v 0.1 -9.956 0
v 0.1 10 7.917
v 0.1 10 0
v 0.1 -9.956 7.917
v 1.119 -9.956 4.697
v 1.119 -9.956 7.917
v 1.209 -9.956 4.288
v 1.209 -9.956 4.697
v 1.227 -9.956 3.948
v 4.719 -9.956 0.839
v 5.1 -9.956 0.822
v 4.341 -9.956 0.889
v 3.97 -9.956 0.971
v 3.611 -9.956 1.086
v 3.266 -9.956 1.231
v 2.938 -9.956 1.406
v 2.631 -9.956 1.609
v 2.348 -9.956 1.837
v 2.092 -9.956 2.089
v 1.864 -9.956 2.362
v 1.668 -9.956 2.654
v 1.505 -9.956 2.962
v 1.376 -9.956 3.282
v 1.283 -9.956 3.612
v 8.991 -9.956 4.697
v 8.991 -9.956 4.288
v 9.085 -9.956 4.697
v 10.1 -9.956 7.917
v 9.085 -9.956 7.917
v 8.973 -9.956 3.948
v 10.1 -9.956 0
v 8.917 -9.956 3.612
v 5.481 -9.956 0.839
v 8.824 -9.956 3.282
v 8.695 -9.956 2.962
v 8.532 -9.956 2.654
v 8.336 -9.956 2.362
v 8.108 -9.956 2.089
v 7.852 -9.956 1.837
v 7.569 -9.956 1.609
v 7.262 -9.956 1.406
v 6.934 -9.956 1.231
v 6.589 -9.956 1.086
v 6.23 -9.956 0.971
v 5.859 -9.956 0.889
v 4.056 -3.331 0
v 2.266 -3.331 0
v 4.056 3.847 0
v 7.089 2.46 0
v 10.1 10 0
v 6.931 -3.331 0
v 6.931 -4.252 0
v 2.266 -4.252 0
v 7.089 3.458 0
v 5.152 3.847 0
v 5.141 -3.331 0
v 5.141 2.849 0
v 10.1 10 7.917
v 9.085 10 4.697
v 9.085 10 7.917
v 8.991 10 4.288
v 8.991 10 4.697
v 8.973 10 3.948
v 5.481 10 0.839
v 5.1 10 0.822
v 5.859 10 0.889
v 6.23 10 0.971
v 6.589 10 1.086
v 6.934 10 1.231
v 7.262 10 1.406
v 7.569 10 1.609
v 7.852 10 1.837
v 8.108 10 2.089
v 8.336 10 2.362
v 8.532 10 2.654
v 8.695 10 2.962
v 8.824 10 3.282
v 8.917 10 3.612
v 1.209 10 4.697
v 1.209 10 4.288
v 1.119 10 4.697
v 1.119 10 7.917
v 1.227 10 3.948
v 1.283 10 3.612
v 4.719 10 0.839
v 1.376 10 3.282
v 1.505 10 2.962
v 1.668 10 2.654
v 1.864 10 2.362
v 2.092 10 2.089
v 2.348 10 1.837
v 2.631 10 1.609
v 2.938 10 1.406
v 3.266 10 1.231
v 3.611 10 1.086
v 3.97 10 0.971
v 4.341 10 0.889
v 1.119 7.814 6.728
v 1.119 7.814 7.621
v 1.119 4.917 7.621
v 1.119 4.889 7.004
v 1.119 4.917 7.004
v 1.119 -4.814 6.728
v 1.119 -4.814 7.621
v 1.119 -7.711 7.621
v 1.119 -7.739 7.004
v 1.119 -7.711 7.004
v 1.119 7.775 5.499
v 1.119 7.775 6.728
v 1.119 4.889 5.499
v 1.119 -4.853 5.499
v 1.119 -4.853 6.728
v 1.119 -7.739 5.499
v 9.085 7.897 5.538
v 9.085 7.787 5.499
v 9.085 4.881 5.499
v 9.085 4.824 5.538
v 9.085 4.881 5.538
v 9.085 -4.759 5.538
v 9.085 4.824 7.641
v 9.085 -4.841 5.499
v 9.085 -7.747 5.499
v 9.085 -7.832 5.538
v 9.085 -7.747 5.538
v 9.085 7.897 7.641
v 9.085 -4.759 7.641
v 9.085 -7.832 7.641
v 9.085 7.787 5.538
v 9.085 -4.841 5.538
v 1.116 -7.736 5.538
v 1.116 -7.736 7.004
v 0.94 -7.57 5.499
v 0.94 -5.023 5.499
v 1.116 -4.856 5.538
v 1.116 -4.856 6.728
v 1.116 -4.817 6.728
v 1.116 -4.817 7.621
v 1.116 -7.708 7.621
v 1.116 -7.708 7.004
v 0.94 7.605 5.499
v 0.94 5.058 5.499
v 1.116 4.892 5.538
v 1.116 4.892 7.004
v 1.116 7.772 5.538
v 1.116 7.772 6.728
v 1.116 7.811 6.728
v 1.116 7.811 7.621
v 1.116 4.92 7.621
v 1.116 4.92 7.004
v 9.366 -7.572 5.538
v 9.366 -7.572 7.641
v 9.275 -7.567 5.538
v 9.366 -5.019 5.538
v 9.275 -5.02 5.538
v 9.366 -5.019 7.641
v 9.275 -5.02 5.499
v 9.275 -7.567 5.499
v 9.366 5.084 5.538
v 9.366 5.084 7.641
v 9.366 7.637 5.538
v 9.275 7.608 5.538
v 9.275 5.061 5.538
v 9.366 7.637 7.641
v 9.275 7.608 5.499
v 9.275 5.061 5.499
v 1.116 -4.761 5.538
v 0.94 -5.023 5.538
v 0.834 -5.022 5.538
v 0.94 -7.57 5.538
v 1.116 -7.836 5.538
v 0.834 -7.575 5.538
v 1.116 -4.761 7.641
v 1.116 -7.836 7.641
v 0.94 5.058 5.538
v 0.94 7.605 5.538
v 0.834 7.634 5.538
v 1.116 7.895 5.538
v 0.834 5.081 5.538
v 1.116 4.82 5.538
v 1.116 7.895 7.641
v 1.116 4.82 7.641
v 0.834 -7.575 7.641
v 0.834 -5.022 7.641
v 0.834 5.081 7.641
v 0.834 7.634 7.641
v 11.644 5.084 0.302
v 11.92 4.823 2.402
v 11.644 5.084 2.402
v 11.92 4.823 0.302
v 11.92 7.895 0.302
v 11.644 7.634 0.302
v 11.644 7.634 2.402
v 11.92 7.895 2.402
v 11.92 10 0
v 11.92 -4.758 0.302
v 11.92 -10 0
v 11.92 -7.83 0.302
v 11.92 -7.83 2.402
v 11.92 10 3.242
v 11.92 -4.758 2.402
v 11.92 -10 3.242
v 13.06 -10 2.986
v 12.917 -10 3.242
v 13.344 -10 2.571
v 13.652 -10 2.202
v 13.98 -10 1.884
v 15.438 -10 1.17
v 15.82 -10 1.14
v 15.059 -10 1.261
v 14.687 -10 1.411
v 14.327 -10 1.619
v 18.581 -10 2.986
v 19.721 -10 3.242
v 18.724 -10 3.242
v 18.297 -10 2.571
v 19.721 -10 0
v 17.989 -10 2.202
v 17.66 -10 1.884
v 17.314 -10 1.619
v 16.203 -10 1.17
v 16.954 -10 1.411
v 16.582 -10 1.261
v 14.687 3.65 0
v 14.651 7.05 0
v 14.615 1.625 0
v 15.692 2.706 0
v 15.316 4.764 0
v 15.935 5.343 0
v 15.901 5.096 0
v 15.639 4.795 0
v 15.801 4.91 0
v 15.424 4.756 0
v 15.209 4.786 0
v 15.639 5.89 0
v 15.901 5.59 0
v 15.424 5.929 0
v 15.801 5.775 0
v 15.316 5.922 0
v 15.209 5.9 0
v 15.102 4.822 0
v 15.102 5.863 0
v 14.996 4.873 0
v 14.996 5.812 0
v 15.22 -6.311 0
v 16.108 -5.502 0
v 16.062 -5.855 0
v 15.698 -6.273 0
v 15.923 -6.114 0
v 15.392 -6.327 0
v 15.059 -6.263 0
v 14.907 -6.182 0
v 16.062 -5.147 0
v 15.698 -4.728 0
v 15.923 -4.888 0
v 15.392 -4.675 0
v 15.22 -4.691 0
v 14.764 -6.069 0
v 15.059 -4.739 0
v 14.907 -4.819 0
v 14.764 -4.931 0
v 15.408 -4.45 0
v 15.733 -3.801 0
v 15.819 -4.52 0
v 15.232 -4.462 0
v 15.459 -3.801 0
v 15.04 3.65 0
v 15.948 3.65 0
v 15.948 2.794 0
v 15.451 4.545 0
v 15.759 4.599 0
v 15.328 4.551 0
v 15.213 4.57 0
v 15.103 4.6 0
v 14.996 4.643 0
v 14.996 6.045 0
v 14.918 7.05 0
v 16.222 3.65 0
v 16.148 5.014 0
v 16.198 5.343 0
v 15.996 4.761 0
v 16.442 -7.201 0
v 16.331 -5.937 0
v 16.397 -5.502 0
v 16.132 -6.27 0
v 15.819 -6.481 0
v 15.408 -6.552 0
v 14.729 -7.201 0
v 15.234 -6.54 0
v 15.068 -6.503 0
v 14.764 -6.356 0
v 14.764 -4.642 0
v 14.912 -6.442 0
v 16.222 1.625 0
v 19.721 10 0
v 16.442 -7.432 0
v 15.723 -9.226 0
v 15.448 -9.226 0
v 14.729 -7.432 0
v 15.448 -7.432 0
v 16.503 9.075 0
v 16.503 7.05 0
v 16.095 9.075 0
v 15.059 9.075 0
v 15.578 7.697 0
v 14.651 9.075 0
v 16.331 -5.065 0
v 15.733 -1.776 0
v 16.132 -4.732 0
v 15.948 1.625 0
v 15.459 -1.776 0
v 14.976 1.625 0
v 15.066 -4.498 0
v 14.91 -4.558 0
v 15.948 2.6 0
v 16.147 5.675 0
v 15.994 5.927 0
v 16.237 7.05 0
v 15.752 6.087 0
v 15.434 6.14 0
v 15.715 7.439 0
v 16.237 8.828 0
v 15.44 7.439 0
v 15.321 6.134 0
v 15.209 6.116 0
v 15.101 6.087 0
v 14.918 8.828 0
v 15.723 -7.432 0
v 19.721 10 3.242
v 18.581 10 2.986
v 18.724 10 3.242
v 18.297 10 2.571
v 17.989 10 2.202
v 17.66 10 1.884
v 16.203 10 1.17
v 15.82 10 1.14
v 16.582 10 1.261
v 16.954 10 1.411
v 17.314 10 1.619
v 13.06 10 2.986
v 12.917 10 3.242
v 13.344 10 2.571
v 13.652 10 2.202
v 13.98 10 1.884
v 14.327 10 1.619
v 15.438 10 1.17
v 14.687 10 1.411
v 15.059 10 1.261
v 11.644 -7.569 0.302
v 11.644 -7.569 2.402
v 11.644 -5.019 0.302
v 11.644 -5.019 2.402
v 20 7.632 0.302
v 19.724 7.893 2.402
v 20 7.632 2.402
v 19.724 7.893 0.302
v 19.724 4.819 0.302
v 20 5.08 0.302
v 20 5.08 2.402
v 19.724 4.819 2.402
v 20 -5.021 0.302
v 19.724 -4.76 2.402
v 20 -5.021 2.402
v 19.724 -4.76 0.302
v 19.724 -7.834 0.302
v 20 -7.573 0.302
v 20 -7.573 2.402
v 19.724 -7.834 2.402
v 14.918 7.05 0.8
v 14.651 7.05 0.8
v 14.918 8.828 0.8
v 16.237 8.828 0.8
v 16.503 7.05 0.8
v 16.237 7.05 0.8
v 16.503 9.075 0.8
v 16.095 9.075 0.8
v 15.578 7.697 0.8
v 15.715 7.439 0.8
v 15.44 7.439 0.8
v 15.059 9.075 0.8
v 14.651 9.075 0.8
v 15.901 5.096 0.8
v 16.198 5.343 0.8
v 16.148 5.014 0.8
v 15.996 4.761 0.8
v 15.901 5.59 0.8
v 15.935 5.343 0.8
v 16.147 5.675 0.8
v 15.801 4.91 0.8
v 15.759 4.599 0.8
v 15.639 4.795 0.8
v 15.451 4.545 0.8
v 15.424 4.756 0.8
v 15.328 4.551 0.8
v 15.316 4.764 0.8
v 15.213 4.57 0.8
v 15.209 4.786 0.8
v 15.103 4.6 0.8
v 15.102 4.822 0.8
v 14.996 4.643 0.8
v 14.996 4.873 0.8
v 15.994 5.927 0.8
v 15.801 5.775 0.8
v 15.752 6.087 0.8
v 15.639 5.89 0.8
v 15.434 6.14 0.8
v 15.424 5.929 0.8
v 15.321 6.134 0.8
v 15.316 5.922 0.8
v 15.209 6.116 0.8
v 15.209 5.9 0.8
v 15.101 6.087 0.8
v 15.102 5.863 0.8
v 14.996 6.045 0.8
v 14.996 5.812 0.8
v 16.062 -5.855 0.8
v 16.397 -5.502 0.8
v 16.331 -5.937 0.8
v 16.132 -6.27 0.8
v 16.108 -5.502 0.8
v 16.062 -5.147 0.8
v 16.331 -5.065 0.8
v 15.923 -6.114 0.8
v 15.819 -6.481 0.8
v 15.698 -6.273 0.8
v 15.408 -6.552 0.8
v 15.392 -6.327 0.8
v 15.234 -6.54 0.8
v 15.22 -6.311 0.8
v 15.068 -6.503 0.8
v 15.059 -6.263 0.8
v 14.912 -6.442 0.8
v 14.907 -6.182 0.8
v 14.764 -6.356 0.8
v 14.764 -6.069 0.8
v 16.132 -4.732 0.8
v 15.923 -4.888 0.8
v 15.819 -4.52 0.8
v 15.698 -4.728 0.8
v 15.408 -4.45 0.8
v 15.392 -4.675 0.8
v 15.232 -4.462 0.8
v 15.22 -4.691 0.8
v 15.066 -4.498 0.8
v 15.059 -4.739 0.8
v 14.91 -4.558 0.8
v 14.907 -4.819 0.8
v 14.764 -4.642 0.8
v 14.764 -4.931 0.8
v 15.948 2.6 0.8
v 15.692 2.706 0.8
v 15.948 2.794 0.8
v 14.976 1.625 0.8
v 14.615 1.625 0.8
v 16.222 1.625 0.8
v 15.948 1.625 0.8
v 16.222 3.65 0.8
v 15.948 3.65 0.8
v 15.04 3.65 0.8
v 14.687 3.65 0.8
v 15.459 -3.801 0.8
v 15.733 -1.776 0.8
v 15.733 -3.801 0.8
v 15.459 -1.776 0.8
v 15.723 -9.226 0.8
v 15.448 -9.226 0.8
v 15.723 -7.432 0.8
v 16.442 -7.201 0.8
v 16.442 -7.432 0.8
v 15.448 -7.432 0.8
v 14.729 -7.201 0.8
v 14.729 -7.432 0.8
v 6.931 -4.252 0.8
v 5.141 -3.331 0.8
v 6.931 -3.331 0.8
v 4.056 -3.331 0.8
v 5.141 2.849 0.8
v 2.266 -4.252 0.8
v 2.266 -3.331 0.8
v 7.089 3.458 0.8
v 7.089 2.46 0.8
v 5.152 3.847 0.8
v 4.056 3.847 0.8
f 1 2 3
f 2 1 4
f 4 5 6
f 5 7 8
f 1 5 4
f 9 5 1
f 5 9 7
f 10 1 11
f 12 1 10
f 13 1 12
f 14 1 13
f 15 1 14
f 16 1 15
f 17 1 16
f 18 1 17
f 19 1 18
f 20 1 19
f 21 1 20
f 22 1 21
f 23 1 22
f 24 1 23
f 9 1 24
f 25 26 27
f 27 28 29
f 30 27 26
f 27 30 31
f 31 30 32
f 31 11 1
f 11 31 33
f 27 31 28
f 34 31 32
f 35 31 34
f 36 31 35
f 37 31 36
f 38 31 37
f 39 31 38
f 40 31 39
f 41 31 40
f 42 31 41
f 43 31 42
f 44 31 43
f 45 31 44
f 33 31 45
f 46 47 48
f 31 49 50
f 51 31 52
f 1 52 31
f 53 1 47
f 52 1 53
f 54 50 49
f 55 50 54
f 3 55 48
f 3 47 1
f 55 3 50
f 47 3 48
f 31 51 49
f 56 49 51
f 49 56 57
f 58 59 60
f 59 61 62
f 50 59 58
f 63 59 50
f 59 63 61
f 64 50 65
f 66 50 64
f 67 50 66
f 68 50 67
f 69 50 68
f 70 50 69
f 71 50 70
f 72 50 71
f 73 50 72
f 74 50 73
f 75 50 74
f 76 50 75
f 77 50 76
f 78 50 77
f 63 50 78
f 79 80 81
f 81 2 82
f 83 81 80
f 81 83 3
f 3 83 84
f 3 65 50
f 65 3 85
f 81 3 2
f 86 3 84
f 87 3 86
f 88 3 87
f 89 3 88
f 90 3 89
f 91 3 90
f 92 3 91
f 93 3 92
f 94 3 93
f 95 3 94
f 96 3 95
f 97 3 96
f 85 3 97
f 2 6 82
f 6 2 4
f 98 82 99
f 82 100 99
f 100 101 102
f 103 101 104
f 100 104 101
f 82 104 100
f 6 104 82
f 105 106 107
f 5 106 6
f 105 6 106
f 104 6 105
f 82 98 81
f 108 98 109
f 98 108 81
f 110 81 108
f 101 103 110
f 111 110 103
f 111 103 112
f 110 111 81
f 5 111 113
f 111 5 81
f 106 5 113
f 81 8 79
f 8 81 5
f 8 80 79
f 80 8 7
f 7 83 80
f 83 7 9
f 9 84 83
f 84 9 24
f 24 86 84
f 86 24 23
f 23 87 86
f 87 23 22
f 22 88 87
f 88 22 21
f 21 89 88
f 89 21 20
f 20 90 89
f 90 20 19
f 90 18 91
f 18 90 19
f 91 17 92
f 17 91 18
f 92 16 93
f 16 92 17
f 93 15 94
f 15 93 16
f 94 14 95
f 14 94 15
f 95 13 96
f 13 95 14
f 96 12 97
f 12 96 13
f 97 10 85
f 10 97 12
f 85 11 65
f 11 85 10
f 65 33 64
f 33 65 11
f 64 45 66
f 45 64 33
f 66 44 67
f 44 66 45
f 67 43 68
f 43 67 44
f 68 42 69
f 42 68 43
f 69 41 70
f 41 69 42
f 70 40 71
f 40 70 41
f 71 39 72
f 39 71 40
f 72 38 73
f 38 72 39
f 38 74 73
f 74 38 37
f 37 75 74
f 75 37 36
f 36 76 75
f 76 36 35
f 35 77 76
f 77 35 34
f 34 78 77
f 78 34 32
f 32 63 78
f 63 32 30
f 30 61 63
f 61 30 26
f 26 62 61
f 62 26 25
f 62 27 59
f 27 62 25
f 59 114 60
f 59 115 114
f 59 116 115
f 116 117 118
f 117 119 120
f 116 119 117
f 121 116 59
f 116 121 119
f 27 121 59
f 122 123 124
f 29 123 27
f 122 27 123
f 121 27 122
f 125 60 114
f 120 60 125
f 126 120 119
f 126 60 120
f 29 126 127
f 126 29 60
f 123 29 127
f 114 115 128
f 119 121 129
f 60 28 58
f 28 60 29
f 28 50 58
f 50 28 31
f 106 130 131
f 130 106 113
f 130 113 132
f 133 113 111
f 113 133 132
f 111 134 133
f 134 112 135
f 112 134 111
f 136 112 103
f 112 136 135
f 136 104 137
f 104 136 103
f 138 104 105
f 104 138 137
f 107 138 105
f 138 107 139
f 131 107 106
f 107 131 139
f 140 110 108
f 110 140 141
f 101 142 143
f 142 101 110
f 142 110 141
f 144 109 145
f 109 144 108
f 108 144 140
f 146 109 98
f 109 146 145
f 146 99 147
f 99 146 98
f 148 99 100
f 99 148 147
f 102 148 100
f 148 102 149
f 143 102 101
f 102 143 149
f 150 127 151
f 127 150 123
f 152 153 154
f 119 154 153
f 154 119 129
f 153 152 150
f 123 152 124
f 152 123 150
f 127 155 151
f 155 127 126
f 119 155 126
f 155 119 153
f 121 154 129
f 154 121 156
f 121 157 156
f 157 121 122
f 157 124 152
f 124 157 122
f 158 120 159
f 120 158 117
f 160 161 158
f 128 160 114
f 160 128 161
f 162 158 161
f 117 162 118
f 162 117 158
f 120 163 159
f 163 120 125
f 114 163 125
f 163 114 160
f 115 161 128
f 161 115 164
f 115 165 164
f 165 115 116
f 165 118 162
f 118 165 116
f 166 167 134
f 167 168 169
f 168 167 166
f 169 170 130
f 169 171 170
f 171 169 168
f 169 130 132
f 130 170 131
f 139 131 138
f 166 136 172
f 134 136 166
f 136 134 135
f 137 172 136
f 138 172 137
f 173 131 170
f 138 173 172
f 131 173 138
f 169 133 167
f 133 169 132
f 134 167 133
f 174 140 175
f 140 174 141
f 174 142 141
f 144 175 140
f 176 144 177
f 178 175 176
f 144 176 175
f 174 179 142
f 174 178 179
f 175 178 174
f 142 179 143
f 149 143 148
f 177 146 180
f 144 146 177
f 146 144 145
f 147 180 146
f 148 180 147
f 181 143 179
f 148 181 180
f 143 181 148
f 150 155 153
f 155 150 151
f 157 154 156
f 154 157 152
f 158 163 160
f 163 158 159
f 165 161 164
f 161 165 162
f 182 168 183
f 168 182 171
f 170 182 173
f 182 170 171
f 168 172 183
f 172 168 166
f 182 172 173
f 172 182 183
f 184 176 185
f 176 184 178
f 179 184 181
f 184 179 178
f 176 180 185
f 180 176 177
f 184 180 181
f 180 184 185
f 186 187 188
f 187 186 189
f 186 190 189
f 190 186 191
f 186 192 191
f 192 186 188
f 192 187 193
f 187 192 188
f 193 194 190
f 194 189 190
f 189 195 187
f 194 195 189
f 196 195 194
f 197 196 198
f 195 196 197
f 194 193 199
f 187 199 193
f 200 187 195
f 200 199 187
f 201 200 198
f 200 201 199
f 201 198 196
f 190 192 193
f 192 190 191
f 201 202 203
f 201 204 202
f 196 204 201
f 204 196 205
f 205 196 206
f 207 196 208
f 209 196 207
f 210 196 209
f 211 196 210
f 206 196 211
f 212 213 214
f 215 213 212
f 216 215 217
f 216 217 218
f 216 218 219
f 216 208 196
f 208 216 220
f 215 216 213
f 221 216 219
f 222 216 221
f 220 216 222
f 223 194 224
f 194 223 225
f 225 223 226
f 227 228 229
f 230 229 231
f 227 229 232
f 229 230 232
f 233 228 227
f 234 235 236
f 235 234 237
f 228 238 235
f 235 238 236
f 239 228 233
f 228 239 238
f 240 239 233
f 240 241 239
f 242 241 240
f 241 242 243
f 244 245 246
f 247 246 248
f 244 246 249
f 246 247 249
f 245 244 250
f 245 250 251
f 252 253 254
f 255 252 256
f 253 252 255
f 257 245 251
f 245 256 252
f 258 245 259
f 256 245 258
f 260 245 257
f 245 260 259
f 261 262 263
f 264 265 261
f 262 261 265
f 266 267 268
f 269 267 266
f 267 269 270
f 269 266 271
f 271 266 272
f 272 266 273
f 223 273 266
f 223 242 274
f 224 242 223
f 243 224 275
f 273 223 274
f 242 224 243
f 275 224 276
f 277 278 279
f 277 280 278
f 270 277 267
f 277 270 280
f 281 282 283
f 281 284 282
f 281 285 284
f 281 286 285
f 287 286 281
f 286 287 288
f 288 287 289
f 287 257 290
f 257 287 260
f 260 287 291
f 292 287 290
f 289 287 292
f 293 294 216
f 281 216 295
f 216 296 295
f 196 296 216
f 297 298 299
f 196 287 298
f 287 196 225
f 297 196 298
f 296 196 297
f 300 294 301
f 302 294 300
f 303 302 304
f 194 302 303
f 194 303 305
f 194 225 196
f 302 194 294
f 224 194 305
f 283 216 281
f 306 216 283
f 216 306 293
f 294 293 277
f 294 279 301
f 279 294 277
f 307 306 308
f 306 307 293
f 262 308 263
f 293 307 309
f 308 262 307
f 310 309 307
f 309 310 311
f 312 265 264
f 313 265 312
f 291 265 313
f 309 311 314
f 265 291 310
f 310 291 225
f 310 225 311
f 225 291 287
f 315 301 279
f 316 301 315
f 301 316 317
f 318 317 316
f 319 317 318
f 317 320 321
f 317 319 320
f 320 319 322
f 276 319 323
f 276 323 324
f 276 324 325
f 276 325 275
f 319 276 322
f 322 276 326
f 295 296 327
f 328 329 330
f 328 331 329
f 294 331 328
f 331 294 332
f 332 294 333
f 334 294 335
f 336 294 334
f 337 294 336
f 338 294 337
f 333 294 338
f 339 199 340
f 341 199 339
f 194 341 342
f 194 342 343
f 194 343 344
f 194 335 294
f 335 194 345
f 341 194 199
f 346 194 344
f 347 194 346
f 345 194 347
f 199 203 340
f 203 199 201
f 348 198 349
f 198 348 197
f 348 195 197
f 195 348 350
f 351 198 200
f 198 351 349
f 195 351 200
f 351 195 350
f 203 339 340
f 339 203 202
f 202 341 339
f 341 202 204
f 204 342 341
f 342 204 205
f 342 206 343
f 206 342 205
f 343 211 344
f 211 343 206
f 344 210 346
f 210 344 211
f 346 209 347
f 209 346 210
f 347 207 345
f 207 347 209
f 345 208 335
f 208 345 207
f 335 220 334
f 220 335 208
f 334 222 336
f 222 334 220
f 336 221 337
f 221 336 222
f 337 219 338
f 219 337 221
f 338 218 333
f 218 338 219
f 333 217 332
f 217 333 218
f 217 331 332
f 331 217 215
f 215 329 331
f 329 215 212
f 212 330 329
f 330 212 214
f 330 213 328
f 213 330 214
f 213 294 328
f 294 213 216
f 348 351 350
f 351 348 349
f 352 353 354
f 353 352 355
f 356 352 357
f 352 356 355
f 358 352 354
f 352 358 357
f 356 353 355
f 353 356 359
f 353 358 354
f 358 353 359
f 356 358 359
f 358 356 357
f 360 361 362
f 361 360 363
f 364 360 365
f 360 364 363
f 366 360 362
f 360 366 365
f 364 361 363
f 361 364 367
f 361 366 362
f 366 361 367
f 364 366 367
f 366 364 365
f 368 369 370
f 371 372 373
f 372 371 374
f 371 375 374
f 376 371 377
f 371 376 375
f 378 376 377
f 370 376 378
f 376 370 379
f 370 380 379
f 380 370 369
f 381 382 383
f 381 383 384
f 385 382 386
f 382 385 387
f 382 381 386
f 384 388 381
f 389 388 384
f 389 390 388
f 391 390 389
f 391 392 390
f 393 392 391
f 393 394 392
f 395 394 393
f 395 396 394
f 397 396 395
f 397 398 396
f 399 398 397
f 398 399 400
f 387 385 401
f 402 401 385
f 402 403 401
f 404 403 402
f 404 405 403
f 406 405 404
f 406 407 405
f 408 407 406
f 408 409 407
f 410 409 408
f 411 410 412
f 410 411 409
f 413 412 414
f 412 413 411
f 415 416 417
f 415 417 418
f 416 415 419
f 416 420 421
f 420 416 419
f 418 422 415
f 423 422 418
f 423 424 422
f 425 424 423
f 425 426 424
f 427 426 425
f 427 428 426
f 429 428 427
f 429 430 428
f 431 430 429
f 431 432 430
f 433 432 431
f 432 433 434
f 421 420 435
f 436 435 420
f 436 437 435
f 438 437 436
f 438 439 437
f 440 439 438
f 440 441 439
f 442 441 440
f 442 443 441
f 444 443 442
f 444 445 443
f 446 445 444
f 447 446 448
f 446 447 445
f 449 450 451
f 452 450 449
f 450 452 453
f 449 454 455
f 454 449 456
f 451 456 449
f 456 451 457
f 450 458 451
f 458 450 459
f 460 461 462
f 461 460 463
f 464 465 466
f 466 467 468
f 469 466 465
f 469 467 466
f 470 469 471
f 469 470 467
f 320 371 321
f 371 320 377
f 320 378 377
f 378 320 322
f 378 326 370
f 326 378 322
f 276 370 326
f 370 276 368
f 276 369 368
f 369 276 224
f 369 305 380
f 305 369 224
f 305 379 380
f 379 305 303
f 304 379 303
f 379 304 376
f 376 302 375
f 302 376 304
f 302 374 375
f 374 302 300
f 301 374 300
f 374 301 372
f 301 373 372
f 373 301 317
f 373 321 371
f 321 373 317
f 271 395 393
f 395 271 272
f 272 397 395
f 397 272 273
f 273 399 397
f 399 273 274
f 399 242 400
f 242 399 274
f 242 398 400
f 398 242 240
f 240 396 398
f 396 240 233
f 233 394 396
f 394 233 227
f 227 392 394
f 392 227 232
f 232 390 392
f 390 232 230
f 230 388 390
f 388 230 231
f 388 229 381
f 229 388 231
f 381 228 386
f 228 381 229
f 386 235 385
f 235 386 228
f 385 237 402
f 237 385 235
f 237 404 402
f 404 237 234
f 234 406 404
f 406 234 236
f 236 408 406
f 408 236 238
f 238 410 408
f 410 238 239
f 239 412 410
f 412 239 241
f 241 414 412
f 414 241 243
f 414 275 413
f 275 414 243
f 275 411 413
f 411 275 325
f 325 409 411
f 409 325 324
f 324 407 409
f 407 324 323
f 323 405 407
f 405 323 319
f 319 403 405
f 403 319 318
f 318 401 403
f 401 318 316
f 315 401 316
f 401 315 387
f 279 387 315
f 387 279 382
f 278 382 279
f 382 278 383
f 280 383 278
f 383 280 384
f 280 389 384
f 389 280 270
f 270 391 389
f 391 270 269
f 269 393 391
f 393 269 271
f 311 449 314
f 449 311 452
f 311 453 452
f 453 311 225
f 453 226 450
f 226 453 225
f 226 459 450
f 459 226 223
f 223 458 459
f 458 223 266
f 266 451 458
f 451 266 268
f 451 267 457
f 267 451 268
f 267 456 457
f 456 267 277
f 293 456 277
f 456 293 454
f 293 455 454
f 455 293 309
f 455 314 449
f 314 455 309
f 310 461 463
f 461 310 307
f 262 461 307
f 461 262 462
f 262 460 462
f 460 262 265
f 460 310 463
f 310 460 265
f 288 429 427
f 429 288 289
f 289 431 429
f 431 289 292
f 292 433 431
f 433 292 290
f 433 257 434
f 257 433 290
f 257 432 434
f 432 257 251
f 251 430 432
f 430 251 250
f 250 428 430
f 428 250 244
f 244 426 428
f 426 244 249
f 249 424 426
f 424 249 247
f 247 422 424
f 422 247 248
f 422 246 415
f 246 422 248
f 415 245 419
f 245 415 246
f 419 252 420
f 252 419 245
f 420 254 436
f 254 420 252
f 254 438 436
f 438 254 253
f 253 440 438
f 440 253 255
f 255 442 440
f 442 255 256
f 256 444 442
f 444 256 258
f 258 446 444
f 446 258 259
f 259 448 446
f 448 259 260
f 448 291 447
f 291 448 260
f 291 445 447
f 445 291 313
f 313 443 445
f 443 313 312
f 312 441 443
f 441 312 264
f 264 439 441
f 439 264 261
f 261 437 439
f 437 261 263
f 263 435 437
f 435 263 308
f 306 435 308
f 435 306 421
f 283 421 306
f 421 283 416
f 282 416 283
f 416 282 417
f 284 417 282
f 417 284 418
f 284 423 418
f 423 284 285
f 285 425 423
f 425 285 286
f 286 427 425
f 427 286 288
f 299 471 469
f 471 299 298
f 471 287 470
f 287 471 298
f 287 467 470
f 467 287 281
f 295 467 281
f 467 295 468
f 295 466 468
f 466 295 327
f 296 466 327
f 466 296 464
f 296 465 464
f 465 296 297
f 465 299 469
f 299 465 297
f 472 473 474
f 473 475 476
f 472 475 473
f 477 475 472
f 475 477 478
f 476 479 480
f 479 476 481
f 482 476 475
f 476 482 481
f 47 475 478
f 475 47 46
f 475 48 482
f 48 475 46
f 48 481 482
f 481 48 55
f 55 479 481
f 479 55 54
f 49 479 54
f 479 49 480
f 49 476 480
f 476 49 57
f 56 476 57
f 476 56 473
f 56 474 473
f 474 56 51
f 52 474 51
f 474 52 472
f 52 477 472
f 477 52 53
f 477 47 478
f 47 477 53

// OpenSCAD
// ___________________________________________________________________________________________________________//
// Cabel Label.                                                                                               //
// A small customisable tag made for the ends of chargers or network cables to allow for permanent labelling. //
// Can be glued for extra security.                                                                           //
// ___________________________________________________________________________________________________________//

/* [Text] */
hatchTextIn = "McK ICT"; // Hatch text
bottomTextIn = "1"; // Bottom text

font = "Ubuntu"; //[Advent Pro,Alegreya Sans,Amaranth,Arimo,Arvo,Asap,Asul,Bangers,Basic,Bowlby One SC,Bubblegum Sans,Cabin Condensed,Carter One,Electrolize,Encode Sans Compressed,Exo 2,Federo,Fjord One,Geo,Graduate,Helvetica,Happy Monkey,Hind,Karma,Lemon One,Lilita One,Mako,McLaren,Merienda One,Nova Square,Nunito,Oswald,Oxygen,Permanent Marker,Racing Sans One,Roboto,Share,Source Sans Pro,Teko,Terminal Dosis,Ubuntu,Voces,Wallpoet]

/* [Text Size] */
hatchTextSize = 2; //[0.1:0.01:30.0]
bottomTextSize = 8; //[0.1:0.01:30.0]
hatchTextSpacing = 1; //[0.01:0.01:10.0]

/* [Text Positioning] */
hatchTextNudgeX = -14.7; //[-20.0:0.01:20.0]
hatchTextNudgeY = -0.1; //[-20.0:0.01:20.0]
bottomTextNudgeX = -2.5; //[-20.0:0.01:20.0]
bottomTextNudgeY = -0.3; //[-20.0:0.01:20.0]
textIndent = -0.8; //[-2.0:0.01:1.0]

bottomTextRotate = 0; //[0,90,180]

/* [Scale] */
length = 1; //[0.01:0.001:2.0]
width = 1; //[0.01:0.001:2.0]

/* [Hidden] */
bottomText = str(bottomTextIn); // Bottom text string
hatchText = str(hatchTextIn); // Hatch text string

cablelabelPoints = [
	[0.0999994, -9.956, 0],
	[0.0999994, 10, 0],
	[0.0999994, 10, 7.917],
	[0.0999994, -9.956, 7.917],
	[11.644, 5.08355, 0.301999],
	[11.644, 7.63445, 0.301999],
	[11.644, 7.63445, 2.402],
	[11.644, 5.08355, 2.402],
	[11.644, -7.56945, 0.301999],
	[11.644, -5.01855, 0.301999],
	[11.644, -5.01855, 2.402],
	[11.644, -7.56945, 2.402],
	[20, 7.63211, 0.301999],
	[20, 5.07989, 0.301999],
	[20, 5.07989, 2.402],
	[20, 7.63211, 2.402],
	[20, -5.02089, 0.301999],
	[20, -7.57311, 0.301999],
	[20, -7.57311, 2.402],
	[20, -5.02089, 2.402],
	[19.721, -10, 3.242],
	[18.7243, -10, 3.242],
	[19.721, 10, 3.242],
	[1.119, -4.81433, 7.621],
	[1.119, -7.71066, 7.621],
	[1.119, -9.956, 7.917],
	[1.119, 4.91734, 7.621],
	[1.119, 10, 7.917],
	[1.119, 7.81366, 7.621],
	[8.695, -9.956, 2.962],
	[10.1, -9.956, 0],
	[8.532, -9.956, 2.654],
	[8.336, -9.956, 2.362],
	[1.116, 4.92017, 7.621],
	[1.116, 4.92017, 7.004],
	[1.119, 4.91734, 7.004],
	[1.119, 4.88879, 7.004],
	[1.116, 4.89163, 5.538],
	[1.119, 4.88879, 5.499],
	[19.724, 7.89285, 2.402],
	[19.724, 4.81915, 2.402],
	[19.724, -7.83385, 2.402],
	[19.724, -4.76015, 2.402],
	[19.724, 7.89285, 0.301999],
	[19.724, 4.81915, 0.301999],
	[19.724, -7.83385, 0.301999],
	[19.724, -4.76015, 0.301999],
	[1.116, 4.89163, 7.004],
	[5.1, -9.956, 0.822],
	[5.481, -9.956, 0.839],
	[11.92, 4.82294, 2.402],
	[11.92, 7.89506, 2.402],
	[11.92, 10, 3.242],
	[11.92, -4.75794, 2.402],
	[11.92, -10, 3.242],
	[11.92, -7.83006, 2.402],
	[12.9167, -10, 3.242],
	[13.652, -10, 2.202],
	[13.652, 10, 2.202],
	[13.98, 10, 1.884],
	[1.116, 4.82042, 7.641],
	[1.116, 4.82042, 5.538],
	[13.344, -10, 2.571],
	[13.06, 10, 2.986],
	[13.344, 10, 2.571],
	[1.119, -7.73921, 7.004],
	[1.116, -7.73637, 5.538],
	[1.119, -7.73921, 5.499],
	[1.116, -7.73637, 7.004],
	[1.119, -7.71066, 7.004],
	[1.116, -7.70783, 7.004],
	[12.9167, 10, 3.242],
	[1.116, -7.83558, 7.641],
	[1.116, -7.83558, 5.538],
	[18.7243, 10, 3.242],
	[1.119, -4.81433, 6.728],
	[1.116, -4.81717, 6.728],
	[1.119, -4.85326, 6.728],
	[1.116, -4.8561, 6.728],
	[1.116, 7.81083, 6.728],
	[1.119, 7.81366, 6.728],
	[1.119, 7.77474, 6.728],
	[1.116, 7.7719, 6.728],
	[0.94, -7.57012, 5.499],
	[0.94, -7.57012, 5.538],
	[0.834, -7.57458, 5.538],
	[1.119, -9.956, 4.697],
	[1.116, -4.8561, 5.538],
	[1.119, -4.85326, 5.499],
	[0.94, -5.02252, 5.499],
	[0.94, -5.02252, 5.538],
	[1.116, -4.76142, 5.538],
	[0.94, 5.05788, 5.499],
	[0.94, 5.05788, 5.538],
	[0.834, 5.08142, 5.538],
	[18.581, 10, 2.986],
	[1.116, 7.7719, 5.538],
	[1.119, 7.77474, 5.499],
	[0.94, 7.60548, 5.499],
	[0.94, 7.60548, 5.538],
	[1.116, 7.89458, 5.538],
	[17.314, -10, 1.619],
	[17.314, 10, 1.619],
	[17.66, 10, 1.884],
	[16.954, 10, 1.411],
	[0.834, 7.63358, 5.538],
	[11.92, -10, 0],
	[11.92, -4.75794, 0.301999],
	[11.92, -7.83006, 0.301999],
	[11.92, 10, 0],
	[11.92, 4.82294, 0.301999],
	[11.92, 7.89506, 0.301999],
	[15.438, -10, 1.17],
	[15.059, -10, 1.261],
	[19.721, 10, 0],
	[13.98, -10, 1.884],
	[13.06, -10, 2.986],
	[14.687, -10, 1.411],
	[14.327, -10, 1.619],
	[1.119, 10, 4.697],
	[1.209, 10, 4.697],
	[1.209, -9.956, 4.697],
	[18.581, -10, 2.986],
	[19.721, -10, 0],
	[18.297, -10, 2.571],
	[17.989, -10, 2.202],
	[17.66, -10, 1.884],
	[18.297, 10, 2.571],
	[10.1, 10, 0],
	[10.1, -9.956, 7.917],
	[10.1, 10, 7.917],
	[16.954, -10, 1.411],
	[9.085, -7.83165, 5.538],
	[9.085, -7.7466, 5.499],
	[9.085, -7.7466, 5.538],
	[9.275, -5.02018, 5.499],
	[9.085, -4.84061, 5.499],
	[9.085, -4.84061, 5.538],
	[16.582, -10, 1.261],
	[0.834, -5.02242, 5.538],
	[16.203, -10, 1.17],
	[15.82, -10, 1.14],
	[9.085, -4.75935, 5.538],
	[17.989, 10, 2.202],
	[8.991, -9.956, 4.288],
	[9.085, -9.956, 4.697],
	[8.991, -9.956, 4.697],
	[8.973, -9.956, 3.948],
	[9.085, -9.956, 7.917],
	[9.085, 10, 7.917],
	[9.085, 4.82435, 5.538],
	[9.085, 4.8814, 5.499],
	[9.085, 4.8814, 5.538],
	[0.834, -7.57458, 7.641],
	[9.275, 7.60782, 5.499],
	[9.085, 7.78739, 5.499],
	[9.085, 7.78739, 5.538],
	[3.266, -9.956, 1.231],
	[2.938, -9.956, 1.406],
	[3.611, -9.956, 1.086],
	[3.97, -9.956, 0.971],
	[2.631, -9.956, 1.609],
	[2.348, -9.956, 1.837],
	[2.092, -9.956, 2.089],
	[1.864, -9.956, 2.362],
	[1.668, -9.956, 2.654],
	[8.108, 10, 2.089],
	[8.108, -9.956, 2.089],
	[1.505, -9.956, 2.962],
	[1.376, -9.956, 3.282],
	[1.283, -9.956, 3.612],
	[1.227, -9.956, 3.948],
	[9.085, 7.89665, 5.538],
	[9.366, 7.63658, 5.538],
	[1.209, -9.956, 4.288],
	[9.085, 10, 4.697],
	[7.852, -9.956, 1.837],
	[7.569, -9.956, 1.609],
	[7.262, -9.956, 1.406],
	[6.934, -9.956, 1.231],
	[6.589, -9.956, 1.086],
	[6.23, -9.956, 0.971],
	[5.859, -9.956, 0.889],
	[3.97, 10, 0.971],
	[3.611, 10, 1.086],
	[4.719, -9.956, 0.839],
	[4.341, -9.956, 0.889],
	[3.266, 10, 1.231],
	[2.938, 10, 1.406],
	[8.917, -9.956, 3.612],
	[2.631, 10, 1.609],
	[8.824, -9.956, 3.282],
	[2.348, 10, 1.837],
	[0.834, 5.08142, 7.641],
	[8.991, 10, 4.697],
	[9.275, -7.56712, 5.538],
	[9.275, -7.56712, 5.499],
	[9.366, -7.57158, 5.538],
	[9.085, -7.83165, 7.641],
	[0.834, -5.02242, 7.641],
	[9.275, -5.02018, 5.538],
	[0.834, 7.63358, 7.641],
	[2.092, 10, 2.089],
	[1.864, 10, 2.362],
	[1.668, 10, 2.654],
	[1.505, 10, 2.962],
	[1.376, 10, 3.282],
	[9.275, 5.06088, 5.538],
	[9.275, 5.06088, 5.499],
	[1.283, 10, 3.612],
	[7.852, 10, 1.837],
	[9.366, 5.08442, 5.538],
	[9.275, 7.60782, 5.538],
	[7.569, 10, 1.609],
	[7.262, 10, 1.406],
	[6.934, 10, 1.231],
	[6.589, 10, 1.086],
	[6.23, 10, 0.971],
	[9.366, -7.57158, 7.641],
	[5.859, 10, 0.889],
	[5.481, 10, 0.839],
	[8.991, 10, 4.288],
	[8.973, 10, 3.948],
	[4.341, 10, 0.889],
	[4.719, 10, 0.839],
	[8.917, 10, 3.612],
	[8.824, 10, 3.282],
	[9.085, -4.75935, 7.641],
	[8.695, 10, 2.962],
	[8.532, 10, 2.654],
	[8.336, 10, 2.362],
	[15.059, 10, 1.261],
	[14.687, 10, 1.411],
	[14.327, 10, 1.619],
	[5.1, 10, 0.822],
	[9.366, -5.01942, 5.538],
	[9.366, 5.08442, 7.641],
	[9.366, 7.63658, 7.641],
	[9.085, 7.89665, 7.641],
	[9.366, -5.01942, 7.641],
	[9.085, 4.82435, 7.641],
	[1.209, 10, 4.288],
	[1.227, 10, 3.948],
	[1.116, -7.70783, 7.621],
	[1.116, -4.81717, 7.621],
	[1.116, -4.76142, 7.641],
	[1.116, 7.81083, 7.621],
	[16.582, 10, 1.261],
	[1.116, 7.89458, 7.641],
	[15.438, 10, 1.17],
	[15.82, 10, 1.14],
	[16.203, 10, 1.17],
];

cablelabelFaces = [
	[0, 2, 3],
	[1, 2, 0],
	[129, 30, 145],
	[0, 157, 159],
	[0, 163, 162],
	[145, 30, 144],
	[0, 185, 48],
	[144, 30, 147],
	[0, 161, 158],
	[147, 30, 189],
	[189, 30, 191],
	[191, 30, 29],
	[29, 30, 31],
	[31, 30, 32],
	[32, 30, 167],
	[167, 30, 176],
	[176, 30, 177],
	[177, 30, 178],
	[178, 30, 179],
	[179, 30, 180],
	[0, 186, 185],
	[180, 30, 181],
	[181, 30, 182],
	[182, 30, 0],
	[49, 182, 0],
	[0, 160, 186],
	[0, 159, 160],
	[0, 158, 157],
	[0, 48, 49],
	[145, 144, 146],
	[163, 0, 164],
	[164, 0, 165],
	[165, 0, 168],
	[168, 0, 169],
	[169, 0, 170],
	[170, 0, 171],
	[171, 0, 174],
	[174, 0, 121],
	[121, 0, 86],
	[86, 0, 25],
	[25, 0, 3],
	[0, 162, 161],
	[129, 145, 148],
	[0, 128, 1],
	[30, 128, 0],
	[1, 27, 2],
	[119, 27, 1],
	[120, 119, 1],
	[241, 120, 1],
	[242, 241, 1],
	[1, 209, 242],
	[1, 206, 209],
	[1, 205, 206],
	[1, 204, 205],
	[1, 203, 204],
	[1, 202, 203],
	[1, 192, 202],
	[1, 190, 192],
	[1, 188, 190],
	[1, 187, 188],
	[1, 184, 187],
	[1, 183, 184],
	[1, 223, 183],
	[1, 224, 223],
	[1, 234, 224],
	[1, 220, 234],
	[1, 219, 220],
	[1, 128, 219],
	[219, 128, 217],
	[217, 128, 216],
	[216, 128, 215],
	[215, 128, 214],
	[214, 128, 213],
	[213, 128, 210],
	[210, 128, 166],
	[166, 128, 230],
	[230, 128, 229],
	[229, 128, 228],
	[228, 128, 226],
	[225, 130, 222],
	[175, 194, 221],
	[222, 175, 221],
	[130, 149, 175],
	[222, 130, 175],
	[128, 130, 225],
	[226, 128, 225],
	[27, 25, 3],
	[27, 3, 2],
	[27, 119, 80],
	[67, 86, 25],
	[27, 26, 23],
	[65, 67, 25],
	[26, 75, 23],
	[27, 24, 25],
	[24, 65, 25],
	[27, 23, 24],
	[88, 75, 36],
	[88, 119, 86],
	[38, 119, 88],
	[36, 38, 88],
	[27, 80, 28],
	[80, 119, 97],
	[80, 97, 81],
	[97, 119, 38],
	[27, 28, 26],
	[86, 67, 88],
	[65, 24, 69],
	[75, 88, 77],
	[75, 26, 36],
	[36, 26, 35],
	[120, 121, 86],
	[120, 86, 119],
	[120, 241, 174],
	[120, 174, 121],
	[242, 171, 174],
	[242, 174, 241],
	[209, 170, 171],
	[209, 171, 242],
	[206, 169, 170],
	[206, 170, 209],
	[205, 168, 169],
	[205, 169, 206],
	[204, 165, 168],
	[204, 168, 205],
	[203, 164, 165],
	[203, 165, 204],
	[202, 163, 164],
	[202, 164, 203],
	[192, 162, 163],
	[192, 163, 202],
	[190, 161, 162],
	[190, 162, 192],
	[188, 158, 161],
	[188, 161, 190],
	[187, 157, 158],
	[187, 158, 188],
	[184, 159, 157],
	[184, 157, 187],
	[183, 160, 159],
	[183, 159, 184],
	[223, 186, 160],
	[223, 160, 183],
	[224, 185, 186],
	[224, 186, 223],
	[234, 48, 185],
	[234, 185, 224],
	[220, 49, 48],
	[220, 48, 234],
	[219, 182, 49],
	[219, 49, 220],
	[217, 181, 182],
	[217, 182, 219],
	[216, 180, 181],
	[216, 181, 217],
	[215, 179, 180],
	[215, 180, 216],
	[214, 178, 179],
	[214, 179, 215],
	[213, 177, 178],
	[213, 178, 214],
	[210, 176, 177],
	[210, 177, 213],
	[166, 167, 176],
	[166, 176, 210],
	[167, 230, 32],
	[166, 230, 167],
	[32, 229, 31],
	[230, 229, 32],
	[31, 228, 29],
	[229, 228, 31],
	[29, 226, 191],
	[228, 226, 29],
	[191, 225, 189],
	[226, 225, 191],
	[189, 222, 147],
	[225, 222, 189],
	[147, 221, 144],
	[222, 221, 147],
	[144, 194, 146],
	[221, 194, 144],
	[175, 145, 146],
	[175, 146, 194],
	[175, 149, 172],
	[145, 132, 148],
	[145, 134, 132],
	[145, 133, 134],
	[136, 142, 137],
	[175, 136, 145],
	[142, 240, 227],
	[227, 149, 148],
	[198, 227, 148],
	[132, 198, 148],
	[152, 150, 151],
	[151, 175, 155],
	[151, 150, 136],
	[175, 151, 136],
	[156, 155, 172],
	[172, 149, 238],
	[175, 172, 155],
	[238, 149, 240],
	[240, 142, 150],
	[240, 149, 227],
	[142, 136, 150],
	[133, 145, 136],
	[130, 129, 148],
	[130, 148, 149],
	[130, 128, 30],
	[130, 30, 129],
	[66, 65, 68],
	[67, 65, 66],
	[67, 66, 83],
	[88, 67, 83],
	[88, 83, 89],
	[87, 88, 89],
	[77, 88, 87],
	[77, 87, 78],
	[75, 77, 78],
	[75, 78, 76],
	[23, 75, 76],
	[23, 76, 244],
	[243, 23, 244],
	[24, 23, 243],
	[70, 24, 243],
	[69, 24, 70],
	[68, 69, 70],
	[65, 69, 68],
	[97, 38, 92],
	[97, 92, 98],
	[37, 36, 47],
	[38, 36, 37],
	[38, 37, 92],
	[81, 97, 96],
	[81, 96, 82],
	[96, 97, 98],
	[80, 81, 82],
	[80, 82, 79],
	[28, 80, 79],
	[28, 79, 246],
	[33, 28, 246],
	[26, 28, 33],
	[34, 26, 33],
	[35, 26, 34],
	[47, 35, 34],
	[36, 35, 47],
	[132, 218, 198],
	[197, 218, 132],
	[235, 197, 195],
	[132, 134, 195],
	[235, 137, 142],
	[235, 200, 137],
	[195, 197, 132],
	[235, 195, 200],
	[198, 239, 227],
	[218, 239, 198],
	[239, 235, 142],
	[239, 142, 227],
	[200, 135, 136],
	[200, 136, 137],
	[135, 196, 133],
	[135, 133, 136],
	[133, 195, 134],
	[196, 195, 133],
	[150, 236, 240],
	[211, 236, 150],
	[173, 211, 207],
	[150, 152, 207],
	[173, 156, 172],
	[173, 212, 156],
	[207, 211, 150],
	[173, 207, 212],
	[240, 237, 238],
	[236, 237, 240],
	[237, 173, 172],
	[237, 172, 238],
	[212, 154, 155],
	[212, 155, 156],
	[154, 208, 151],
	[154, 151, 155],
	[151, 207, 152],
	[208, 207, 151],
	[66, 73, 85],
	[84, 85, 90],
	[66, 85, 84],
	[90, 85, 139],
	[87, 90, 91],
	[91, 90, 139],
	[66, 84, 83],
	[68, 73, 66],
	[91, 245, 87],
	[87, 245, 76],
	[87, 76, 78],
	[244, 245, 72],
	[243, 244, 72],
	[73, 243, 72],
	[68, 70, 243],
	[73, 68, 243],
	[76, 245, 244],
	[90, 89, 83],
	[90, 83, 84],
	[90, 87, 89],
	[99, 98, 92],
	[99, 92, 93],
	[37, 93, 92],
	[99, 96, 98],
	[37, 61, 94],
	[93, 94, 99],
	[37, 94, 93],
	[99, 94, 105],
	[96, 99, 100],
	[100, 99, 105],
	[47, 61, 37],
	[100, 248, 96],
	[96, 248, 79],
	[96, 79, 82],
	[246, 248, 60],
	[33, 246, 60],
	[61, 33, 60],
	[47, 34, 33],
	[61, 47, 33],
	[79, 248, 246],
	[197, 239, 218],
	[235, 239, 197],
	[196, 200, 195],
	[135, 200, 196],
	[211, 237, 236],
	[173, 237, 211],
	[208, 212, 207],
	[154, 212, 208],
	[199, 139, 85],
	[199, 85, 153],
	[85, 72, 153],
	[73, 72, 85],
	[245, 91, 139],
	[245, 139, 199],
	[153, 245, 199],
	[72, 245, 153],
	[201, 105, 94],
	[201, 94, 193],
	[94, 60, 193],
	[61, 60, 94],
	[248, 100, 105],
	[248, 105, 201],
	[193, 248, 201],
	[60, 248, 193],
	[50, 110, 4],
	[50, 4, 7],
	[4, 111, 5],
	[110, 111, 4],
	[4, 6, 7],
	[5, 6, 4],
	[51, 50, 7],
	[51, 7, 6],
	[109, 52, 111],
	[55, 106, 108],
	[109, 110, 106],
	[50, 52, 53],
	[109, 111, 110],
	[51, 52, 50],
	[111, 52, 51],
	[107, 50, 53],
	[110, 107, 106],
	[53, 52, 54],
	[55, 53, 54],
	[106, 55, 54],
	[108, 106, 107],
	[50, 107, 110],
	[5, 51, 6],
	[111, 51, 5],
	[20, 123, 124],
	[106, 141, 140],
	[20, 122, 21],
	[124, 123, 125],
	[125, 123, 126],
	[126, 123, 101],
	[106, 113, 112],
	[101, 123, 131],
	[131, 123, 138],
	[138, 123, 106],
	[140, 138, 106],
	[117, 106, 118],
	[118, 106, 115],
	[115, 106, 57],
	[57, 106, 62],
	[62, 106, 116],
	[116, 106, 56],
	[56, 106, 54],
	[20, 124, 122],
	[106, 112, 141],
	[106, 117, 113],
	[106, 114, 109],
	[123, 114, 106],
	[109, 71, 52],
	[63, 71, 109],
	[64, 63, 109],
	[109, 58, 64],
	[109, 59, 58],
	[109, 233, 59],
	[109, 232, 233],
	[109, 231, 232],
	[109, 249, 231],
	[109, 250, 249],
	[109, 251, 250],
	[109, 247, 251],
	[109, 114, 247],
	[247, 114, 104],
	[102, 22, 103],
	[103, 22, 143],
	[143, 22, 127],
	[22, 74, 95],
	[127, 22, 95],
	[114, 22, 102],
	[104, 114, 102],
	[71, 56, 54],
	[71, 54, 52],
	[55, 108, 8],
	[55, 8, 11],
	[8, 107, 9],
	[108, 107, 8],
	[53, 55, 11],
	[53, 11, 10],
	[9, 53, 10],
	[107, 53, 9],
	[63, 116, 56],
	[63, 56, 71],
	[64, 62, 116],
	[64, 116, 63],
	[58, 57, 62],
	[58, 62, 64],
	[59, 115, 57],
	[59, 57, 58],
	[233, 118, 115],
	[233, 115, 59],
	[232, 117, 118],
	[232, 118, 233],
	[231, 113, 117],
	[231, 117, 232],
	[249, 112, 113],
	[249, 113, 231],
	[250, 141, 112],
	[250, 112, 249],
	[251, 140, 141],
	[251, 141, 250],
	[247, 138, 140],
	[247, 140, 251],
	[104, 131, 138],
	[104, 138, 247],
	[102, 101, 131],
	[102, 131, 104],
	[103, 126, 101],
	[103, 101, 102],
	[143, 125, 126],
	[143, 126, 103],
	[125, 127, 124],
	[143, 127, 125],
	[124, 95, 122],
	[127, 95, 124],
	[122, 74, 21],
	[95, 74, 122],
	[22, 20, 21],
	[22, 21, 74],
	[22, 114, 123],
	[22, 123, 20],
	[8, 10, 11],
	[9, 10, 8],
	[43, 15, 39],
	[12, 15, 43],
	[44, 12, 43],
	[13, 12, 44],
	[15, 12, 13],
	[15, 13, 14],
	[44, 39, 40],
	[43, 39, 44],
	[15, 14, 40],
	[15, 40, 39],
	[14, 13, 44],
	[14, 44, 40],
	[46, 19, 42],
	[16, 19, 46],
	[45, 16, 46],
	[17, 16, 45],
	[19, 16, 17],
	[19, 17, 18],
	[45, 42, 41],
	[46, 42, 45],
	[19, 18, 41],
	[19, 41, 42],
	[18, 17, 45],
	[18, 45, 41],
];

module cablelabel() {
 	polyhedron(points = cablelabelPoints, faces = cablelabelFaces);
}

difference() {
    scale([width, length, width])
    cablelabel();
    rotate([0, 180, 0])
    translate([hatchTextNudgeX,hatchTextNudgeY,textIndent])
    linear_extrude(height=3)
    text(hatchText, size=hatchTextSize, font = font, halign = "center", valign = "center", spacing = hatchTextSpacing, direction = "ttb");
    rotate([0, 180, bottomTextRotate])
    translate([bottomTextNudgeX,bottomTextNudgeY,textIndent])
    linear_extrude(height=3)
    text(bottomText, size=bottomTextSize, font = font, halign = "center", valign = "center", direction = "ttb");
}

// preview[view:north, tilt:bottom]
